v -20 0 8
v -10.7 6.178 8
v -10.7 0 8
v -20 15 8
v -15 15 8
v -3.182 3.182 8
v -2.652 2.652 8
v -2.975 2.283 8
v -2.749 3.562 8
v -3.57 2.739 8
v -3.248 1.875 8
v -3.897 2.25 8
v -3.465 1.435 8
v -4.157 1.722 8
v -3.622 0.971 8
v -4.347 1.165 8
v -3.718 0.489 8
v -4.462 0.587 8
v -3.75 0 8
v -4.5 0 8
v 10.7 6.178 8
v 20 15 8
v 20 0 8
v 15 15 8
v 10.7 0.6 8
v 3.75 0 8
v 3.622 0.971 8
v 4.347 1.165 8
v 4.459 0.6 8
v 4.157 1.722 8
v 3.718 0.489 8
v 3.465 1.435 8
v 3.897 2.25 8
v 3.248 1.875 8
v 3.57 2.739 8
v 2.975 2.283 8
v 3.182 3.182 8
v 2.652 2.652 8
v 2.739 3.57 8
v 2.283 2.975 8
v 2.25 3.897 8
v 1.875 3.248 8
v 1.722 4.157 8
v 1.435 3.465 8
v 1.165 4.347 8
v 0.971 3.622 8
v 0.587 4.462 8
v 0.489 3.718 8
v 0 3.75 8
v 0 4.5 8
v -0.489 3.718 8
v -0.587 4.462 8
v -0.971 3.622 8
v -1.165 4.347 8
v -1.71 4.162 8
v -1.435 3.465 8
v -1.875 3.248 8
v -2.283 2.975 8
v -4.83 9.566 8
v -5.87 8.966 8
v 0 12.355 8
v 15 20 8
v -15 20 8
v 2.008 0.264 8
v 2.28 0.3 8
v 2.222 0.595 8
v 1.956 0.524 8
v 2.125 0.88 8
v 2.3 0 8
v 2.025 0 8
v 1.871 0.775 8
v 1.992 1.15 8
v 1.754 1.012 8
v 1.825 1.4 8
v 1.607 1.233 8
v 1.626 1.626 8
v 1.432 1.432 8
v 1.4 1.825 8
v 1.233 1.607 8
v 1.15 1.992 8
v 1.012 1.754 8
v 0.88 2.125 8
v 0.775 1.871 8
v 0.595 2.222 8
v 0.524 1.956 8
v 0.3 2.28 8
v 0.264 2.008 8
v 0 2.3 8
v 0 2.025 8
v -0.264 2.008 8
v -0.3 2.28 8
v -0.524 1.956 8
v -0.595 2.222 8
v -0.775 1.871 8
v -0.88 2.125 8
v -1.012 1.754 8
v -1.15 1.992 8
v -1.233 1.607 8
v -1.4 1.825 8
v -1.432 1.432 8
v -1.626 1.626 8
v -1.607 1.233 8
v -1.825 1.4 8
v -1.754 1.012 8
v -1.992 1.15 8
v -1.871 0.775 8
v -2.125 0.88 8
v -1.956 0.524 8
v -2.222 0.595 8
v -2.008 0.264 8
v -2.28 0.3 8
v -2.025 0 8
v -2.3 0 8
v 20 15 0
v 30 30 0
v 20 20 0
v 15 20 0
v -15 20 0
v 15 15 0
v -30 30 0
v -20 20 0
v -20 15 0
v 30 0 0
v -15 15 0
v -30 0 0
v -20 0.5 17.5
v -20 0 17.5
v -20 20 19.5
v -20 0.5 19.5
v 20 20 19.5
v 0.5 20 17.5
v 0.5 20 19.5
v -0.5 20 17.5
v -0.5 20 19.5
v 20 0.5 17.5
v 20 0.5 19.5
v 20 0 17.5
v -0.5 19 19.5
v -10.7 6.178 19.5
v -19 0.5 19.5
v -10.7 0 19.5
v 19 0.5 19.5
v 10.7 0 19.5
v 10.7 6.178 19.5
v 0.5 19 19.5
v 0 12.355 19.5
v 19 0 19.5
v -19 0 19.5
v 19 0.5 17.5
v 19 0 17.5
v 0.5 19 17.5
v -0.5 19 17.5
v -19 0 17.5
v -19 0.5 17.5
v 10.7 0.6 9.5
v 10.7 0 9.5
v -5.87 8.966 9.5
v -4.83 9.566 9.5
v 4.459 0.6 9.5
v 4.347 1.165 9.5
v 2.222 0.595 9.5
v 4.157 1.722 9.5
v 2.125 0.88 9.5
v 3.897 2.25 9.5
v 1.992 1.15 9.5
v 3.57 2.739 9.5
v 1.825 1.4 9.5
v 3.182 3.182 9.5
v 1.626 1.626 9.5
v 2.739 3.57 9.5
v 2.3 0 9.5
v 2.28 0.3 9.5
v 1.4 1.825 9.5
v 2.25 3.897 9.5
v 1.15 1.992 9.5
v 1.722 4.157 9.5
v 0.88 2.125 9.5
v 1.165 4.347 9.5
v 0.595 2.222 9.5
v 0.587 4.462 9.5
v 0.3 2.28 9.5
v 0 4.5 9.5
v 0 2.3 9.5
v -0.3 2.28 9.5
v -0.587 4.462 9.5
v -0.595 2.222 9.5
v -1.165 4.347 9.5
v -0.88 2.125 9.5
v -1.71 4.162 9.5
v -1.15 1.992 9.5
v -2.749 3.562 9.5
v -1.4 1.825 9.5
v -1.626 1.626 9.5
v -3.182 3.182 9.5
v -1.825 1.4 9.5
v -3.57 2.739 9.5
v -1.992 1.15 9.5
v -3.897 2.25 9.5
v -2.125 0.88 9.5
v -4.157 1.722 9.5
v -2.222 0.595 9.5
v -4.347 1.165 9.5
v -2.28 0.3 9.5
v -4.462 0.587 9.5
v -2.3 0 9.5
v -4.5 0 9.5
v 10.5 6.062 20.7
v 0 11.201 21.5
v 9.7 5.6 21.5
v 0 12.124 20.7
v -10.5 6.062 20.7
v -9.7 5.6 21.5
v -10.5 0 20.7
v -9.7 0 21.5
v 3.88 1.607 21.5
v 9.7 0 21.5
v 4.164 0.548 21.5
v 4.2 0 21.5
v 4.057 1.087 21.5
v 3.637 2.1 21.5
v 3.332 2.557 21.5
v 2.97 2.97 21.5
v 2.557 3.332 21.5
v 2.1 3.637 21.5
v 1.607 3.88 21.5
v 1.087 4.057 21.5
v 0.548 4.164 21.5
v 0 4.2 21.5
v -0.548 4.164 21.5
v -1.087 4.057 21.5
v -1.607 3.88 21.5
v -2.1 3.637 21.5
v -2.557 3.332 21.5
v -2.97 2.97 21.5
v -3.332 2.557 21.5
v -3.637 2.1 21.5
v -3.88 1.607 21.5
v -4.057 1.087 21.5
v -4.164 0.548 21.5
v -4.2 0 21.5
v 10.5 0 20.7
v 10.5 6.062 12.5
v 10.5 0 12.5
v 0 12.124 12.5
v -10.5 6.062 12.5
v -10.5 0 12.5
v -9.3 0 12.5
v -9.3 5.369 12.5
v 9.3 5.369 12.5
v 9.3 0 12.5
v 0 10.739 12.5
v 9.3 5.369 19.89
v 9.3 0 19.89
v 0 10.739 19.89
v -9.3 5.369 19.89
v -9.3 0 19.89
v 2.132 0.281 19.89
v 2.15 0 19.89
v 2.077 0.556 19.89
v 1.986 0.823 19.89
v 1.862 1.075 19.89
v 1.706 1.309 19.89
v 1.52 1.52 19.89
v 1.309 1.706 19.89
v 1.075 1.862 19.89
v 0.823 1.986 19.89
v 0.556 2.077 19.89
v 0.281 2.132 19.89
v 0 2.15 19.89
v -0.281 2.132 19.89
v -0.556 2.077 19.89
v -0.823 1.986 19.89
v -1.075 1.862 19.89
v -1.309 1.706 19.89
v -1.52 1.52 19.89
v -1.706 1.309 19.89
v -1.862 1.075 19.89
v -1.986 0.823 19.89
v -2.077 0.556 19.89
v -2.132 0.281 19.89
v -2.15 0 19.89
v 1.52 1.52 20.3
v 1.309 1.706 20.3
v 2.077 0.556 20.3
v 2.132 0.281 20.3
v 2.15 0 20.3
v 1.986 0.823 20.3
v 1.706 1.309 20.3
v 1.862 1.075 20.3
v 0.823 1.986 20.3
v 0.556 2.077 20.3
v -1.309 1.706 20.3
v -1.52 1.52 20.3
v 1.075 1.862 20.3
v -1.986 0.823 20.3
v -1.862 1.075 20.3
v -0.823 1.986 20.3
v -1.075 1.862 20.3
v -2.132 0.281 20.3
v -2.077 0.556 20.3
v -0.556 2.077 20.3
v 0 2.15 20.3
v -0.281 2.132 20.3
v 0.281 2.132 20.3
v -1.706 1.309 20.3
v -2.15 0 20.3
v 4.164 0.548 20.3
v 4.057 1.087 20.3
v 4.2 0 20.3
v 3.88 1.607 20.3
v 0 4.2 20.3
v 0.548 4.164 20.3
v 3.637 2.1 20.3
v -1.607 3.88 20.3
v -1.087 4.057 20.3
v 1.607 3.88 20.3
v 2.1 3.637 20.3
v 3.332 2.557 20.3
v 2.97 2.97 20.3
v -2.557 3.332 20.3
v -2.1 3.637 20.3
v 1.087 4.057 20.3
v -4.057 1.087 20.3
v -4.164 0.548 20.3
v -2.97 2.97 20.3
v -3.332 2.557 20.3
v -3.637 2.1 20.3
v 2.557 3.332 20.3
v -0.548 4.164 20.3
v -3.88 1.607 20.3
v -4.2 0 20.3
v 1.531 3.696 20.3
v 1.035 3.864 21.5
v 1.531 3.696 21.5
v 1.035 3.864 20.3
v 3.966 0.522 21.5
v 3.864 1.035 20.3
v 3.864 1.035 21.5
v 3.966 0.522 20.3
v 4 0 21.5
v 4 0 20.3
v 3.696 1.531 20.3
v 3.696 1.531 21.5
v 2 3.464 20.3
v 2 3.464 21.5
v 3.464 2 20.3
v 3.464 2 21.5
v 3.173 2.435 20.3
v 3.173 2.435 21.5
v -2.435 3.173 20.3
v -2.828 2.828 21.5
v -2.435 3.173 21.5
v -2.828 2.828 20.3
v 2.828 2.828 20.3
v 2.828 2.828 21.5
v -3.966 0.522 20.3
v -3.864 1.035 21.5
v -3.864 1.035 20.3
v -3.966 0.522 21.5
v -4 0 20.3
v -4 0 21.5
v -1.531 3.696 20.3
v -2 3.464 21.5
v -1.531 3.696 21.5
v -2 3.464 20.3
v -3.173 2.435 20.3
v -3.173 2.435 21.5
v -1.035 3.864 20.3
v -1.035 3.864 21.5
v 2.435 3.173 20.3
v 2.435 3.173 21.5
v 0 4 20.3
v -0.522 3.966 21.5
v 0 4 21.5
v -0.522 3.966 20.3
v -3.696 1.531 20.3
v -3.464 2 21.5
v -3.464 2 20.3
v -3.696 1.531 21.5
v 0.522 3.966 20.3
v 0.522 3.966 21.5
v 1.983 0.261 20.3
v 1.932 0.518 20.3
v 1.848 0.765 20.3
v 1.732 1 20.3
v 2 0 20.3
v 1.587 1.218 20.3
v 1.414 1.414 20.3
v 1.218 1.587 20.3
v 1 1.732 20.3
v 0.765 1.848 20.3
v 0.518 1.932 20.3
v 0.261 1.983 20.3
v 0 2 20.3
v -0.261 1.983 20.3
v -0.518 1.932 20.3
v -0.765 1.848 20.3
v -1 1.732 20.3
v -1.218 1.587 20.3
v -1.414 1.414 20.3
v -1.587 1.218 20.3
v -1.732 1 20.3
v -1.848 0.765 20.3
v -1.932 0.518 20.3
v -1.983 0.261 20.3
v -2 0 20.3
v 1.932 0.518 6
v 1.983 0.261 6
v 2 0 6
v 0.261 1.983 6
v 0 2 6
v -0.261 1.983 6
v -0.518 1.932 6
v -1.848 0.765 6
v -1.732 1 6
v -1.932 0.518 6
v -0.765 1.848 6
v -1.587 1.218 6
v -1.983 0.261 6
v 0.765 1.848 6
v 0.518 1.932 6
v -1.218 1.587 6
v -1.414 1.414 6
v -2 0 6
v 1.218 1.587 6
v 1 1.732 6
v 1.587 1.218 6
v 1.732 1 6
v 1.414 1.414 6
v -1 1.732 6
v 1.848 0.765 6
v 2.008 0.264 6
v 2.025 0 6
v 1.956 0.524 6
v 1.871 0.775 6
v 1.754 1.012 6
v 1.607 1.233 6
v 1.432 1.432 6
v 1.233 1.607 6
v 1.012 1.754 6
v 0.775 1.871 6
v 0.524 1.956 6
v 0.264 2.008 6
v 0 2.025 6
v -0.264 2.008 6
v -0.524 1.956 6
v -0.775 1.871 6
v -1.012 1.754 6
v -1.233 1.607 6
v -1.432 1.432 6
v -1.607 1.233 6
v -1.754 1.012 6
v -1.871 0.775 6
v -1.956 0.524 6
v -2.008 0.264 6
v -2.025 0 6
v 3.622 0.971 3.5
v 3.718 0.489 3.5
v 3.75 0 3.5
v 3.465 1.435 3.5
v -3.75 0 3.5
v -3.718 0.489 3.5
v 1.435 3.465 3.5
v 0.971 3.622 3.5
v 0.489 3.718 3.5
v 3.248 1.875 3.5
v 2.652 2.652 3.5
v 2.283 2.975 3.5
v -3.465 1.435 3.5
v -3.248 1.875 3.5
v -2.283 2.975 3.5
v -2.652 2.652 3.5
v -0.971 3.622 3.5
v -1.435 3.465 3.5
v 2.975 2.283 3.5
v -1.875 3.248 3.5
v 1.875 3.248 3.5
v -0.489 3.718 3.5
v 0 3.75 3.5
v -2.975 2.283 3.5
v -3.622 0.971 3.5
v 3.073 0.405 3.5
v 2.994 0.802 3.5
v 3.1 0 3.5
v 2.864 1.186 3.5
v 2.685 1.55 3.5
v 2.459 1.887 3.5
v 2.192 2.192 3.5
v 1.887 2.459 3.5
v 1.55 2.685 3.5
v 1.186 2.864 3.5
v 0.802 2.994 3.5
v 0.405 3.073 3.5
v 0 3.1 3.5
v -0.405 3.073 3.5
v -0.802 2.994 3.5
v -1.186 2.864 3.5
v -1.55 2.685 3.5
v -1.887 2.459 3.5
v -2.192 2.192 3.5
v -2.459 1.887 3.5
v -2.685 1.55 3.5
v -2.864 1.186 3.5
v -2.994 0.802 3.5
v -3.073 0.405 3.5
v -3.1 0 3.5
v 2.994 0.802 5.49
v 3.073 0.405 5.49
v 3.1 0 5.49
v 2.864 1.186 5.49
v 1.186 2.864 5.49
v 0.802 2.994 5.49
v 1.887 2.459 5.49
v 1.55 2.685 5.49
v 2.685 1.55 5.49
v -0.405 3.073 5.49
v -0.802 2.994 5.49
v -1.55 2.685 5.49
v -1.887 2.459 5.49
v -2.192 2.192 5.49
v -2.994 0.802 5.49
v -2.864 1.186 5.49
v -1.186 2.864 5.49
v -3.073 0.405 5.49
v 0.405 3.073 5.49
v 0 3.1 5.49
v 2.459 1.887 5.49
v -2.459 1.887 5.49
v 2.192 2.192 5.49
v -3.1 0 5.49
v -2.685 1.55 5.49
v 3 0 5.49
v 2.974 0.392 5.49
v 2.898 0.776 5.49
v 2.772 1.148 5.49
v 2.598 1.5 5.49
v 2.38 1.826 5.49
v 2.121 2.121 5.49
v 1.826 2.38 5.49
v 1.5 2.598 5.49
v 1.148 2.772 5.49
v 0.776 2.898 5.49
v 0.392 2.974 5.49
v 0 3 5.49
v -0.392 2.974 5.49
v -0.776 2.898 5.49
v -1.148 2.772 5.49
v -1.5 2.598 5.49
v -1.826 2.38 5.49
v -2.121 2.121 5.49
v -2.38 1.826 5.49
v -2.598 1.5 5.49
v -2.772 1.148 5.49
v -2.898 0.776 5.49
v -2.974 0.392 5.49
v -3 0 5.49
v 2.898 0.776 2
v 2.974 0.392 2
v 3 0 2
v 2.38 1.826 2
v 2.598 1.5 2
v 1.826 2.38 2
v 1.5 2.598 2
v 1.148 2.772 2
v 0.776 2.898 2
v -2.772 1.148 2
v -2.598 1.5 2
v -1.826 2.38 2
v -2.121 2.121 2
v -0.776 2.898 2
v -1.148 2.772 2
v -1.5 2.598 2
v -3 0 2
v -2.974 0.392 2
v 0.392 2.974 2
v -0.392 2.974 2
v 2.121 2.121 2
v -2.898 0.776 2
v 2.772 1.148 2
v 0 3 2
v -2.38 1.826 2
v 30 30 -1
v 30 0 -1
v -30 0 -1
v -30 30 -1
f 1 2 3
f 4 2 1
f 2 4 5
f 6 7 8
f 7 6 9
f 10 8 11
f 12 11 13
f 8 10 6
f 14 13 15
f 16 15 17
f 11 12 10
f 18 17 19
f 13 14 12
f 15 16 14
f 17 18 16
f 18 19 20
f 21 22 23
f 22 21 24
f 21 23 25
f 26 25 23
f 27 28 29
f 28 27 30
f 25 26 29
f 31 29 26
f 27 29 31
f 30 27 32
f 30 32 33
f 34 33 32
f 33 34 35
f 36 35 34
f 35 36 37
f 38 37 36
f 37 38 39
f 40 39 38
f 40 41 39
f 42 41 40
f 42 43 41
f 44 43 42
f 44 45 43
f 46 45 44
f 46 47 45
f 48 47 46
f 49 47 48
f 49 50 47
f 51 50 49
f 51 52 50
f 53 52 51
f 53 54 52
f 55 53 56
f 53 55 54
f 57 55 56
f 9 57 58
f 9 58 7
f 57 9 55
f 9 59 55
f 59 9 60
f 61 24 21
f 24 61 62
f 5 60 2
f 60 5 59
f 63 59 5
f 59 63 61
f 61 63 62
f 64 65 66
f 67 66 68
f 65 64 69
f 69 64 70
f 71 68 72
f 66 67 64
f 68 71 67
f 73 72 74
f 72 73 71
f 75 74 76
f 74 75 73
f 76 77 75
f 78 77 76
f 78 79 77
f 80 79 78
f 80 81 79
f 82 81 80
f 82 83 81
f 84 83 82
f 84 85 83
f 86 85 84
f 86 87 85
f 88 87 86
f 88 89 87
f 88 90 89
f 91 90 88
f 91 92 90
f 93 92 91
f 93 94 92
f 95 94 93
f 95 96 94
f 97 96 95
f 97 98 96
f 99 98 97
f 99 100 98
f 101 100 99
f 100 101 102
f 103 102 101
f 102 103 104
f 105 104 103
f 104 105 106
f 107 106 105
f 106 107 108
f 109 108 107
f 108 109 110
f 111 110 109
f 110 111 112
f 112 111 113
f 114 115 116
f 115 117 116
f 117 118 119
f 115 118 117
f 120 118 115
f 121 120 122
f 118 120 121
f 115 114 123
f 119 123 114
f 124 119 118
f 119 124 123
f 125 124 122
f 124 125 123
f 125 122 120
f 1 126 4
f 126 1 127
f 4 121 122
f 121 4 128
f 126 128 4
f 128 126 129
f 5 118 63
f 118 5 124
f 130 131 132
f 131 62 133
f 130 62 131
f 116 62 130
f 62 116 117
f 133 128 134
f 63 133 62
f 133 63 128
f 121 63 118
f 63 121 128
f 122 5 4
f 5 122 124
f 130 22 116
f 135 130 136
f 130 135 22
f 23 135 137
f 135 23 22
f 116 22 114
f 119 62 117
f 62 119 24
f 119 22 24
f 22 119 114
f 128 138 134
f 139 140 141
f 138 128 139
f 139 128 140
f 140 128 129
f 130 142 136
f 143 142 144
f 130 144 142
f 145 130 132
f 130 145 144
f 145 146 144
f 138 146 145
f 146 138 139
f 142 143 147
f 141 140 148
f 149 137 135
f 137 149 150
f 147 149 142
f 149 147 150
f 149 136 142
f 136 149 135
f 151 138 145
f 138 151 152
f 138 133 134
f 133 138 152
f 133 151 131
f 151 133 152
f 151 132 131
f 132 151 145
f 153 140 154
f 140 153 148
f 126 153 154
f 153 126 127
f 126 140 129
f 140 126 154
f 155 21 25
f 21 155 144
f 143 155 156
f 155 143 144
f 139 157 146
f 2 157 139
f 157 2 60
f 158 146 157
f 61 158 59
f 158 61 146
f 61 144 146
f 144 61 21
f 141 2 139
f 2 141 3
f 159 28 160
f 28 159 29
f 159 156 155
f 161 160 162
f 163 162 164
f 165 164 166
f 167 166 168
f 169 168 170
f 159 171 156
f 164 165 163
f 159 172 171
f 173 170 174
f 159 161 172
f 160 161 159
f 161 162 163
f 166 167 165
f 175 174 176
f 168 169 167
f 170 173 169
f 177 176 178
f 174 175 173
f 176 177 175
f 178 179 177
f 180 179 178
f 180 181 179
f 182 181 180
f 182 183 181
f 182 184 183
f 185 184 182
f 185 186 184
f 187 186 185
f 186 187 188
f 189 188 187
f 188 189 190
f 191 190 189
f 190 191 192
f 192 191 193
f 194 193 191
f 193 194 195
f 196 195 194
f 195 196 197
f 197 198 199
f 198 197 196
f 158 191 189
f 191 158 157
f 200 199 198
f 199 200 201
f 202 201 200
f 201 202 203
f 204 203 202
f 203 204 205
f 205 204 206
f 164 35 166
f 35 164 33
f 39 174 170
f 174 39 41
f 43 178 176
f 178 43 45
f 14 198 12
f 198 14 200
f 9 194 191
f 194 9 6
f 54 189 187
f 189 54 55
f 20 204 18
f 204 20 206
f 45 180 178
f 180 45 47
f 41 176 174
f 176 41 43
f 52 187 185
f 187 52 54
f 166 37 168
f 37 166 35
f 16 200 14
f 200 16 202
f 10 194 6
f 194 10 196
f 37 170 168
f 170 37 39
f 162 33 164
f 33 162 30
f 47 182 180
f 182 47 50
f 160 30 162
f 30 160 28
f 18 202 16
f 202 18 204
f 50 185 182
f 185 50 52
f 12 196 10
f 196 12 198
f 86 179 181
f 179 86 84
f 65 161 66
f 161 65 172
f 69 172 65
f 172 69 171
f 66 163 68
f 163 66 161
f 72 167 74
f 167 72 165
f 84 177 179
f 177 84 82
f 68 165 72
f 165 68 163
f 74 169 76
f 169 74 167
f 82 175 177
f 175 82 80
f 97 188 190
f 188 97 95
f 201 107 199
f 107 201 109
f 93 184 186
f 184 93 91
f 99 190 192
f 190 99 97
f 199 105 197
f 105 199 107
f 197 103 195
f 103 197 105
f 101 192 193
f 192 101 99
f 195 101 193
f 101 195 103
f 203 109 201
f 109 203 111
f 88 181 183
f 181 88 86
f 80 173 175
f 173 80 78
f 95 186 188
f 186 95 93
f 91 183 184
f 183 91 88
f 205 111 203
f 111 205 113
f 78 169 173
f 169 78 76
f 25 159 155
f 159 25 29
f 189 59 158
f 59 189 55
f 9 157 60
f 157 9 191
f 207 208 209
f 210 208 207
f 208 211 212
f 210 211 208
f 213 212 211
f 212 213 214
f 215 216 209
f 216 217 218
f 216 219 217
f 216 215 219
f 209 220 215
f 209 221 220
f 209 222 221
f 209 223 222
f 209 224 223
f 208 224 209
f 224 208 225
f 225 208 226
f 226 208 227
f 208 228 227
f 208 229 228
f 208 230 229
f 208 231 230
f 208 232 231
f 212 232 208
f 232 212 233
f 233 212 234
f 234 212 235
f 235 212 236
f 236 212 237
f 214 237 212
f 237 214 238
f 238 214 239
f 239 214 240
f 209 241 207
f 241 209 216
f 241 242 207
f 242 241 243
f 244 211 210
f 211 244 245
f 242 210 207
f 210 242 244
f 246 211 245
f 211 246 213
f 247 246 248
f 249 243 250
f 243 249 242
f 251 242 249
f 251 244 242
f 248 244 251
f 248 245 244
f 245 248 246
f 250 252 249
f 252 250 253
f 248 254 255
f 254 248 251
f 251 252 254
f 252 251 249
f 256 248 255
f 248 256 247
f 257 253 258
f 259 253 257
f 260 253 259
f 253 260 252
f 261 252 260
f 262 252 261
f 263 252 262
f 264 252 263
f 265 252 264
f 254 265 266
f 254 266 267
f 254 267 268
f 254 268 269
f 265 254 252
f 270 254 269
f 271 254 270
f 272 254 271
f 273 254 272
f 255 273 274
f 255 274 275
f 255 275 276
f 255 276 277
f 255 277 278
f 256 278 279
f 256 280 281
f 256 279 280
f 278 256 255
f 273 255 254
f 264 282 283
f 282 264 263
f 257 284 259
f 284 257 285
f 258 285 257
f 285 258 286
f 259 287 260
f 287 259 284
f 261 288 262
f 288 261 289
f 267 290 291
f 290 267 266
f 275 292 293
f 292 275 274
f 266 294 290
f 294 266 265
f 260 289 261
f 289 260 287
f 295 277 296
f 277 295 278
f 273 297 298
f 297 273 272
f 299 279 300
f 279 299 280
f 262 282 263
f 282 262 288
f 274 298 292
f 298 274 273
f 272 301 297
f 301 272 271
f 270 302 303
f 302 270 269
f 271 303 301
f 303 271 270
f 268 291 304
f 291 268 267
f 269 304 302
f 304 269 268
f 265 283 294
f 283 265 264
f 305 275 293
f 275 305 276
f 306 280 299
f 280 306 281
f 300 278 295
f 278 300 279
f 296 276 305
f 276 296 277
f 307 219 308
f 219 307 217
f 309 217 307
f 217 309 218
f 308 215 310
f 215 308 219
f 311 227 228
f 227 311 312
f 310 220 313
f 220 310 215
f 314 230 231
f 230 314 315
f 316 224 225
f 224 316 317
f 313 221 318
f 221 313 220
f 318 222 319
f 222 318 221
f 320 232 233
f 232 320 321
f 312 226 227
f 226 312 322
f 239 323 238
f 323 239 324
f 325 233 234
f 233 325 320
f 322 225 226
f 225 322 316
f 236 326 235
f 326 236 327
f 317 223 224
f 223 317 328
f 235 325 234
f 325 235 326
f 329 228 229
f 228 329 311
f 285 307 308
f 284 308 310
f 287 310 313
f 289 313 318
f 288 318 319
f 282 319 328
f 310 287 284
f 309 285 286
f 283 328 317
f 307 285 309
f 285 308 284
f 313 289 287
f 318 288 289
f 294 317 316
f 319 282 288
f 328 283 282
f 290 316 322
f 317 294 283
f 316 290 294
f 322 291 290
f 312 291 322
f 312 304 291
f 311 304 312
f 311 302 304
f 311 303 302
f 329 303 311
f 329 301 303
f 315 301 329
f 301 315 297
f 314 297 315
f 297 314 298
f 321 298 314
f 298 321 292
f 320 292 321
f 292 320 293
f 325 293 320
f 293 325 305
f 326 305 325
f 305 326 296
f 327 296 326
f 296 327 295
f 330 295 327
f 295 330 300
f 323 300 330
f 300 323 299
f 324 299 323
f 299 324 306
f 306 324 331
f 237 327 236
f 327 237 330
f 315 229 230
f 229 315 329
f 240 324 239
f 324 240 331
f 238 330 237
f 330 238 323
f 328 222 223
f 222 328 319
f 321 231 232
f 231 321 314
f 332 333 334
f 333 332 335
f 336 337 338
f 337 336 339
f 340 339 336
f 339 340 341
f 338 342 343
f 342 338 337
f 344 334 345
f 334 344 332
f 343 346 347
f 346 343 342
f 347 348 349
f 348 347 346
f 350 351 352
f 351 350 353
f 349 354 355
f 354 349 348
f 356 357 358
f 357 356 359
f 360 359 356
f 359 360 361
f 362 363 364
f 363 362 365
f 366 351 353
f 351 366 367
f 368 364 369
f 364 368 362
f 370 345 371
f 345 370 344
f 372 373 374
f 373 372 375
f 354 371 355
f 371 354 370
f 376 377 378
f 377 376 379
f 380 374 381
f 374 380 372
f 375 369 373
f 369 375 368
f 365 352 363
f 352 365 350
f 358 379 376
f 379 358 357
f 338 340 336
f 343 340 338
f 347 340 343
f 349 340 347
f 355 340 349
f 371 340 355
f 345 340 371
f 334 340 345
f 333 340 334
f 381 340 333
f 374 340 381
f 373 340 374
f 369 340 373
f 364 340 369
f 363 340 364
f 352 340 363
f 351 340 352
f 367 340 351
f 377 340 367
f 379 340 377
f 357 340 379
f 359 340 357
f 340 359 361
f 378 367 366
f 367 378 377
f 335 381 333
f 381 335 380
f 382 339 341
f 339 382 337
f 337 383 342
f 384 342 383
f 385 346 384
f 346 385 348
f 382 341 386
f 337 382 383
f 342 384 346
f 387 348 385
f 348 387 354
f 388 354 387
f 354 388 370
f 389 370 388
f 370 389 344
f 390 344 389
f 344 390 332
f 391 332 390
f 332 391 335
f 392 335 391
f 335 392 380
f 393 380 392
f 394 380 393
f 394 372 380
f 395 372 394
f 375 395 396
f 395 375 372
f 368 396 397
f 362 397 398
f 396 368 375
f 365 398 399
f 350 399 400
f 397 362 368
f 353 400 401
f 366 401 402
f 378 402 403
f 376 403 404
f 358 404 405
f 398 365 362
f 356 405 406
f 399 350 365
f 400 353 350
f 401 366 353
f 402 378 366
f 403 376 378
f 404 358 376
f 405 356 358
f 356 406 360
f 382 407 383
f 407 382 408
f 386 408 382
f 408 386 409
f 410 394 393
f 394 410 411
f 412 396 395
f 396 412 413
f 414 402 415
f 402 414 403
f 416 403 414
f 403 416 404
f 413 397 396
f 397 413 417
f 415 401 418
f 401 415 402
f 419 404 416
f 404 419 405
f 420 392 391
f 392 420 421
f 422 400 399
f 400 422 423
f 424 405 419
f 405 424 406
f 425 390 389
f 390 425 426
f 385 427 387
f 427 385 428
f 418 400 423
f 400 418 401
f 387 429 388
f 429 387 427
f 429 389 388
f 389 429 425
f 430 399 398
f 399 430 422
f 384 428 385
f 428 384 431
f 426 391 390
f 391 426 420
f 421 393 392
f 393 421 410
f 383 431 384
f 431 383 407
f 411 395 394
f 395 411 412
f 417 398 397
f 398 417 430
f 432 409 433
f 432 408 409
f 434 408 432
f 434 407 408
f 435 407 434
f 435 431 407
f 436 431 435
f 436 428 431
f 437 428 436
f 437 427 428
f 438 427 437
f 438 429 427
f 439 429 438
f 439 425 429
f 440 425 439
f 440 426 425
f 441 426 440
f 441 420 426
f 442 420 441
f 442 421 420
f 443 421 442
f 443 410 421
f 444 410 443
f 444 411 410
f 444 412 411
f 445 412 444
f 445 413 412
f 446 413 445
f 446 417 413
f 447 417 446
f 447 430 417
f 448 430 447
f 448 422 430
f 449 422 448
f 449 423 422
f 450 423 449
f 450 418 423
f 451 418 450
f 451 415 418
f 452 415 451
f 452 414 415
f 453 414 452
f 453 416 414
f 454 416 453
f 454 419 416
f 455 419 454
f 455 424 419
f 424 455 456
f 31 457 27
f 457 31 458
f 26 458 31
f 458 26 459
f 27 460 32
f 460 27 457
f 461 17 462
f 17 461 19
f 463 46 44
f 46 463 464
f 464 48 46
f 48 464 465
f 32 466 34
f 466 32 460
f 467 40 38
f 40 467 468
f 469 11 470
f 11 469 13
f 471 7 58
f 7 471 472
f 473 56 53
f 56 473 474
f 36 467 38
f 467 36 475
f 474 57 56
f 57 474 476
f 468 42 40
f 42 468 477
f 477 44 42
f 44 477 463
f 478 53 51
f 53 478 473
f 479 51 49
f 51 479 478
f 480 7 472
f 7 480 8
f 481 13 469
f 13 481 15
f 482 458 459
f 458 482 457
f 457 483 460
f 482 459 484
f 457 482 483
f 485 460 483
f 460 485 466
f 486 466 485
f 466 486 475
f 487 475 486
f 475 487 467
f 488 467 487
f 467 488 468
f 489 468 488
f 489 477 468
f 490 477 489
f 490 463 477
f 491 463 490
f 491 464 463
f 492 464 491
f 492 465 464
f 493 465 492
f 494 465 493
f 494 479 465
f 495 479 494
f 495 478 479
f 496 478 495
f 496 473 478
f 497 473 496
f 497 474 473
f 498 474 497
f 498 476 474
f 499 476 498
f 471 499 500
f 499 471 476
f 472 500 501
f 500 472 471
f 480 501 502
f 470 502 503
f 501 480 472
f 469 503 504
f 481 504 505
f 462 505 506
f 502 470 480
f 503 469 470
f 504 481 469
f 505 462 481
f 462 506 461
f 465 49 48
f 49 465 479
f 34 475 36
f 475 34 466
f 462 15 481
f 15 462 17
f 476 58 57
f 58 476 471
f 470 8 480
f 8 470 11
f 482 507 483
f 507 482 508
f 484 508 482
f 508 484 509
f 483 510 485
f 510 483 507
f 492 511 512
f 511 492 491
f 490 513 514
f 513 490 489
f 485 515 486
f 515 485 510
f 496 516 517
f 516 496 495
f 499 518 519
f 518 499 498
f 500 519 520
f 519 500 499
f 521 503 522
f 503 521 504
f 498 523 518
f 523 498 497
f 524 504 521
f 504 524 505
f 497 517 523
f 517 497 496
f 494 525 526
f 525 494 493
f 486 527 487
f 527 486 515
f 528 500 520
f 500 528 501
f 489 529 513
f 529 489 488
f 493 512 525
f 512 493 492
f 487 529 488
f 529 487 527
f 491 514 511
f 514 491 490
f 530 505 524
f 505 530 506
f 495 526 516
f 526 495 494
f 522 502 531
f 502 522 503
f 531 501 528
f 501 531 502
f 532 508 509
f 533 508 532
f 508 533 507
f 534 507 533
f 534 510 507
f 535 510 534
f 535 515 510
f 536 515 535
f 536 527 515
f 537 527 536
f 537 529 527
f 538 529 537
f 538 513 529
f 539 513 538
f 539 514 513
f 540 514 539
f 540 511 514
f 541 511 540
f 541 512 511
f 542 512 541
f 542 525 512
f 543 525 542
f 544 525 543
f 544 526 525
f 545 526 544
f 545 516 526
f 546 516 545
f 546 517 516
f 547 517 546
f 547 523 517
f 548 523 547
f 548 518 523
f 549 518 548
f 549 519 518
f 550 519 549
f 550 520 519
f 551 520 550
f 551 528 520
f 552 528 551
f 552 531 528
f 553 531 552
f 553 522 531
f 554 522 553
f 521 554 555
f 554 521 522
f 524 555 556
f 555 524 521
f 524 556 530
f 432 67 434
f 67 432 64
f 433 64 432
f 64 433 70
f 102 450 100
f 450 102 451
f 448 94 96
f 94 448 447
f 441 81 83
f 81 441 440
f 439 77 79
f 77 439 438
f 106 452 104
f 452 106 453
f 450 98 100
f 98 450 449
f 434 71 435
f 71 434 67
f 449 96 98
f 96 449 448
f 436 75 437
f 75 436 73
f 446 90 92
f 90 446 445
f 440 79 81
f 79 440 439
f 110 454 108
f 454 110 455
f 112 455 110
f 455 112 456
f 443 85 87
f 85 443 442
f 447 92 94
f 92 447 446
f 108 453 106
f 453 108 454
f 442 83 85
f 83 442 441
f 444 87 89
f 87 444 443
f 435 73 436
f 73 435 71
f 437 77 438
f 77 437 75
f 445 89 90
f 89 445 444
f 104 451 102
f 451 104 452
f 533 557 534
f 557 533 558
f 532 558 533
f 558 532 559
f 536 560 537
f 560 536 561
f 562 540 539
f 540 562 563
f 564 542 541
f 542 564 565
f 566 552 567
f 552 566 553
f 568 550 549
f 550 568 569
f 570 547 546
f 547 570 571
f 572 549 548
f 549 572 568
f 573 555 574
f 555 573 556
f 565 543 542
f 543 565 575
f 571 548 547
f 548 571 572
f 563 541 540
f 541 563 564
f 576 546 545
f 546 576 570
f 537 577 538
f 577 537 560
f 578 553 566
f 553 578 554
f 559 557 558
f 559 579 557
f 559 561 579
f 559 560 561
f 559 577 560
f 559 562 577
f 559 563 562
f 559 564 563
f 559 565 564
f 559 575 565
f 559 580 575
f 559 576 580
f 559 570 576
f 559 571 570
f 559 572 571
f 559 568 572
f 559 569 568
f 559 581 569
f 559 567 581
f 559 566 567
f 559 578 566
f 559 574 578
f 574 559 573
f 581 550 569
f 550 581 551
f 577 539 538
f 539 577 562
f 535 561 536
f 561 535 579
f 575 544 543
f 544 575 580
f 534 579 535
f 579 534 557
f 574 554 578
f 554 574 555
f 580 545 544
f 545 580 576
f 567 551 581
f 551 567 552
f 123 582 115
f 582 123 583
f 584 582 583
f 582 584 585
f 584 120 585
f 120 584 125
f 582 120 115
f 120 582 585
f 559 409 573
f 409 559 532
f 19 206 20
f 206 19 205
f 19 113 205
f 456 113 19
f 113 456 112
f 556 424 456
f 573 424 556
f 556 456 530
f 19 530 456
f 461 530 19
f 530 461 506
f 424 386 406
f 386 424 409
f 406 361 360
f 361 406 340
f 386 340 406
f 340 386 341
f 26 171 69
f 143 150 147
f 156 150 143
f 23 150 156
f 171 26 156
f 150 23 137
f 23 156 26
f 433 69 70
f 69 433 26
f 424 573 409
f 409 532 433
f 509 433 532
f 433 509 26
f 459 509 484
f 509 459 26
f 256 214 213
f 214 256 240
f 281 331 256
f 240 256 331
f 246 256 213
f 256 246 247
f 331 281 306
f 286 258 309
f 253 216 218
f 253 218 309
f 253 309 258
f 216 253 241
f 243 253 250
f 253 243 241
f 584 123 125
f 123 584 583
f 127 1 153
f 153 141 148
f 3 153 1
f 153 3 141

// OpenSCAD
// file: test_key.scad
// Single-key test housing (build step 1). Sits directly on the screen on four plastic legs
// (non-conductive, so they don't register as touches). Line the bore up with the hex outline in touch-test/.
// Print upside down (top face on the bed), no supports: the spider spokes bridge.
include <common.scad>

BLOCK = 40;
LEG = 5;

module test_key() {
  difference() {
    union() {
      translate([-BLOCK / 2, -BLOCK / 2, SPIDER_Z]) cube([BLOCK, BLOCK, PLATE_TOP_Z - SPIDER_Z]);
      for (x = [-1, 1], y = [-1, 1])
        translate([x * (BLOCK / 2 - LEG / 2) - LEG / 2, y * (BLOCK / 2 - LEG / 2) - LEG / 2, 0])
          cube([LEG, LEG, SPIDER_Z]);
    }
    bore();
    // alignment notches on the four sides, on the key centre lines
    for (a = [0, 90, 180, 270]) rotate([0, 0, a])
      translate([BLOCK / 2 - 1, -0.5, PLATE_TOP_Z - 2]) cube([2, 1, 3]);
  }
  spider();
}

test_key();
// file: common.scad
// Hexboard overlay — shared dimensions and part modules.
// All values hardcoded in mm. z = 0 is the iPad glass. Hexes are pointy-top (a vertex points along +Y),
// matching the app's key grid (app/js/geometry.js).

$fn = 48;

// ---------- grid ----------
PITCH   = 24.15;                 // key centre-to-centre
ROW     = PITCH * sqrt(3) / 2;   // 20.914 between rows

// ---------- cap (translucent PETG) ----------
CAP_FLAT   = 21.0;   // outer flat-to-flat
CAP_H      = 9.0;
CAP_WALL   = 1.2;
CAP_TOP    = 1.6;    // top thickness
CAP_HOLE   = 4.3;    // stem through-hole
CB_D       = 8.4;    // counterbore for plunger head
CB_DEPTH   = 1.2;

// ---------- plunger (conductive PLA) ----------
HEAD_D     = 8.0;
HEAD_H     = 1.2;
STEM_D     = 4.0;
STEM_L     = 14.3;   // below the head

// ---------- tip cup (conductive PLA) + conductive foam ----------
CUP_D      = 7.5;
CUP_H      = 4.5;
SOCKET_D   = 4.05;   // press fit on the stem
SOCKET_DEPTH = 2.0;
POCKET_D   = 6.2;    // holds a 6 mm conductive foam disc
POCKET_DEPTH = 2.0;
FOAM_PROTRUDE = 1.5; // foam below the cup (foam disc 6 x 3.5 mm)

// ---------- vertical stack (rest position) ----------
REST_GAP     = 2.0;                                  // foam to glass at rest
CUP_TOP_Z    = REST_GAP + FOAM_PROTRUDE + CUP_H;     // 8.0: cup stops under the spider
SPIDER_Z     = CUP_TOP_Z;                            // spider bottom = plate bottom
SPIDER_T     = 1.5;
TRAVEL_STOP  = 3.0;                                  // cap bottom to spider at rest
CAP_BOTTOM_Z = SPIDER_Z + SPIDER_T + TRAVEL_STOP;    // 12.5
CAP_TOP_Z    = CAP_BOTTOM_Z + CAP_H;                 // 21.5
PLATE_TOP_Z  = CAP_TOP_Z - 2.0;                      // 19.5: caps stand 2 mm proud
// Pressed to the stop: foam is 1 mm into the glass (compressed), which is the pressure range.

// ---------- bore + spider (part of each housing) ----------
BORE_FLAT    = 21.4;  // 0.2 mm clearance per side
SPIDER_RING_ID = 4.6; // stem slides through
SPIDER_RING_OD = 9.0; // spring seat (spring: 0.5 mm wire, 7 mm OD, ~15 mm free length)
SPOKE_W      = 1.2;

// ---------- iPad Air 4 (A2316) ----------
IPAD_W   = 247.6;
IPAD_H   = 178.5;
IPAD_T   = 6.1;
IPAD_R   = 18.0;     // corner radius (approximate: measure yours)
SCREEN_W = 227.06;   // 2360 px / 264 ppi
SCREEN_H = 157.79;   // 1640 px / 264 ppi
STRIP    = 18.0;     // uncovered control strip along the top edge of the screen
// Key grid centre relative to screen centre (y up): matches app geometry.
GRID_Y   = -(SCREEN_H + STRIP) / 2 + SCREEN_H / 2;   // -9.0

// ---------- helpers ----------
module hex(flat, h) { rotate([0, 0, 30]) cylinder(r = flat / sqrt(3), h = h, $fn = 6); }

// Key centres for the 51-key grid: 6 rows of 9 / 8 keys, row 0 nearest the player.
function key_q(r, j) = (r % 2 == 1) ? j - 3.5 : j - 4;
function key_pos(r, j) = [key_q(r, j) * PITCH, GRID_Y + (r - 2.5) * ROW];

// ---------- parts ----------
// Cap: hollow hex, open at the bottom. Print top-down (top face on the bed).
module cap() {
  difference() {
    hex(CAP_FLAT, CAP_H);
    translate([0, 0, -0.01]) hex(CAP_FLAT - 2 * CAP_WALL, CAP_H - CAP_TOP);
    translate([0, 0, -1]) cylinder(d = CAP_HOLE, h = CAP_H + 2);
    translate([0, 0, CAP_H - CB_DEPTH]) cylinder(d = CB_D, h = CB_DEPTH + 1);
    // soft top edge
    translate([0, 0, CAP_H - 0.8])
      difference() { hex(CAP_FLAT + 2, 2); hex_chamfer(); }
  }
}
module hex_chamfer() {
  rotate([0, 0, 30]) cylinder(r1 = CAP_FLAT / sqrt(3), r2 = (CAP_FLAT - 1.6) / sqrt(3), h = 0.8, $fn = 6);
}

// Plunger: head sits flush in the cap's counterbore; stem runs down through the spider.
// Print head-down.
module plunger() {
  cylinder(d = HEAD_D, h = HEAD_H);
  cylinder(d = STEM_D, h = HEAD_H + STEM_L);
}

// Tip cup: socket on top (stem), pocket underneath (foam). Print socket-up.
module tip_cup() {
  difference() {
    cylinder(d = CUP_D, h = CUP_H);
    translate([0, 0, -0.01]) cylinder(d = POCKET_D, h = POCKET_DEPTH);
    translate([0, 0, CUP_H - SOCKET_DEPTH]) cylinder(d = SOCKET_D, h = SOCKET_DEPTH + 1);
  }
}

// Spider: three spokes from the bore wall to the spring-seat ring. Positioned at z = SPIDER_Z.
module spider() {
  translate([0, 0, SPIDER_Z]) {
    difference() {
      cylinder(d = SPIDER_RING_OD, h = SPIDER_T);
      translate([0, 0, -1]) cylinder(d = SPIDER_RING_ID, h = SPIDER_T + 2);
    }
    for (a = [0, 120, 240]) rotate([0, 0, a])   // toward the bore's flat sides
      translate([SPIDER_RING_OD / 2 - 0.5, -SPOKE_W / 2, 0])
        cube([BORE_FLAT / 2 - SPIDER_RING_OD / 2 + 1.5, SPOKE_W, SPIDER_T]);
  }
}

// Bore cut-out (through the plate), used with difference().
module bore() { translate([0, 0, SPIDER_Z - 1]) hex(BORE_FLAT, PLATE_TOP_Z - SPIDER_Z + 2); }

// Whole key assembly at rest, for previews.
module key_assembly() {
  color([0.6, 0.9, 0.8, 0.6]) translate([0, 0, CAP_BOTTOM_Z]) cap();
  color("dimgray") translate([0, 0, CAP_TOP_Z]) mirror([0, 0, 1]) plunger();
  color("dimgray") translate([0, 0, CUP_TOP_Z - CUP_H]) tip_cup();
  color("black") translate([0, 0, REST_GAP]) cylinder(d = 6, h = FOAM_PROTRUDE + POCKET_DEPTH);
}
// main file
// Visual check only (not for printing): test housing cut in half with a key at rest, on the glass.
include <common.scad>
use <test_key.scad>

difference() {
  union() {
    color("white") test_key();
    key_assembly();
    color([0.1, 0.1, 0.12]) translate([-30, -30, -1]) cube([60, 60, 1]);  // glass
  }
  translate([-50, -50, -10]) cube([100, 50, 50]);  // cut away the front half
}
